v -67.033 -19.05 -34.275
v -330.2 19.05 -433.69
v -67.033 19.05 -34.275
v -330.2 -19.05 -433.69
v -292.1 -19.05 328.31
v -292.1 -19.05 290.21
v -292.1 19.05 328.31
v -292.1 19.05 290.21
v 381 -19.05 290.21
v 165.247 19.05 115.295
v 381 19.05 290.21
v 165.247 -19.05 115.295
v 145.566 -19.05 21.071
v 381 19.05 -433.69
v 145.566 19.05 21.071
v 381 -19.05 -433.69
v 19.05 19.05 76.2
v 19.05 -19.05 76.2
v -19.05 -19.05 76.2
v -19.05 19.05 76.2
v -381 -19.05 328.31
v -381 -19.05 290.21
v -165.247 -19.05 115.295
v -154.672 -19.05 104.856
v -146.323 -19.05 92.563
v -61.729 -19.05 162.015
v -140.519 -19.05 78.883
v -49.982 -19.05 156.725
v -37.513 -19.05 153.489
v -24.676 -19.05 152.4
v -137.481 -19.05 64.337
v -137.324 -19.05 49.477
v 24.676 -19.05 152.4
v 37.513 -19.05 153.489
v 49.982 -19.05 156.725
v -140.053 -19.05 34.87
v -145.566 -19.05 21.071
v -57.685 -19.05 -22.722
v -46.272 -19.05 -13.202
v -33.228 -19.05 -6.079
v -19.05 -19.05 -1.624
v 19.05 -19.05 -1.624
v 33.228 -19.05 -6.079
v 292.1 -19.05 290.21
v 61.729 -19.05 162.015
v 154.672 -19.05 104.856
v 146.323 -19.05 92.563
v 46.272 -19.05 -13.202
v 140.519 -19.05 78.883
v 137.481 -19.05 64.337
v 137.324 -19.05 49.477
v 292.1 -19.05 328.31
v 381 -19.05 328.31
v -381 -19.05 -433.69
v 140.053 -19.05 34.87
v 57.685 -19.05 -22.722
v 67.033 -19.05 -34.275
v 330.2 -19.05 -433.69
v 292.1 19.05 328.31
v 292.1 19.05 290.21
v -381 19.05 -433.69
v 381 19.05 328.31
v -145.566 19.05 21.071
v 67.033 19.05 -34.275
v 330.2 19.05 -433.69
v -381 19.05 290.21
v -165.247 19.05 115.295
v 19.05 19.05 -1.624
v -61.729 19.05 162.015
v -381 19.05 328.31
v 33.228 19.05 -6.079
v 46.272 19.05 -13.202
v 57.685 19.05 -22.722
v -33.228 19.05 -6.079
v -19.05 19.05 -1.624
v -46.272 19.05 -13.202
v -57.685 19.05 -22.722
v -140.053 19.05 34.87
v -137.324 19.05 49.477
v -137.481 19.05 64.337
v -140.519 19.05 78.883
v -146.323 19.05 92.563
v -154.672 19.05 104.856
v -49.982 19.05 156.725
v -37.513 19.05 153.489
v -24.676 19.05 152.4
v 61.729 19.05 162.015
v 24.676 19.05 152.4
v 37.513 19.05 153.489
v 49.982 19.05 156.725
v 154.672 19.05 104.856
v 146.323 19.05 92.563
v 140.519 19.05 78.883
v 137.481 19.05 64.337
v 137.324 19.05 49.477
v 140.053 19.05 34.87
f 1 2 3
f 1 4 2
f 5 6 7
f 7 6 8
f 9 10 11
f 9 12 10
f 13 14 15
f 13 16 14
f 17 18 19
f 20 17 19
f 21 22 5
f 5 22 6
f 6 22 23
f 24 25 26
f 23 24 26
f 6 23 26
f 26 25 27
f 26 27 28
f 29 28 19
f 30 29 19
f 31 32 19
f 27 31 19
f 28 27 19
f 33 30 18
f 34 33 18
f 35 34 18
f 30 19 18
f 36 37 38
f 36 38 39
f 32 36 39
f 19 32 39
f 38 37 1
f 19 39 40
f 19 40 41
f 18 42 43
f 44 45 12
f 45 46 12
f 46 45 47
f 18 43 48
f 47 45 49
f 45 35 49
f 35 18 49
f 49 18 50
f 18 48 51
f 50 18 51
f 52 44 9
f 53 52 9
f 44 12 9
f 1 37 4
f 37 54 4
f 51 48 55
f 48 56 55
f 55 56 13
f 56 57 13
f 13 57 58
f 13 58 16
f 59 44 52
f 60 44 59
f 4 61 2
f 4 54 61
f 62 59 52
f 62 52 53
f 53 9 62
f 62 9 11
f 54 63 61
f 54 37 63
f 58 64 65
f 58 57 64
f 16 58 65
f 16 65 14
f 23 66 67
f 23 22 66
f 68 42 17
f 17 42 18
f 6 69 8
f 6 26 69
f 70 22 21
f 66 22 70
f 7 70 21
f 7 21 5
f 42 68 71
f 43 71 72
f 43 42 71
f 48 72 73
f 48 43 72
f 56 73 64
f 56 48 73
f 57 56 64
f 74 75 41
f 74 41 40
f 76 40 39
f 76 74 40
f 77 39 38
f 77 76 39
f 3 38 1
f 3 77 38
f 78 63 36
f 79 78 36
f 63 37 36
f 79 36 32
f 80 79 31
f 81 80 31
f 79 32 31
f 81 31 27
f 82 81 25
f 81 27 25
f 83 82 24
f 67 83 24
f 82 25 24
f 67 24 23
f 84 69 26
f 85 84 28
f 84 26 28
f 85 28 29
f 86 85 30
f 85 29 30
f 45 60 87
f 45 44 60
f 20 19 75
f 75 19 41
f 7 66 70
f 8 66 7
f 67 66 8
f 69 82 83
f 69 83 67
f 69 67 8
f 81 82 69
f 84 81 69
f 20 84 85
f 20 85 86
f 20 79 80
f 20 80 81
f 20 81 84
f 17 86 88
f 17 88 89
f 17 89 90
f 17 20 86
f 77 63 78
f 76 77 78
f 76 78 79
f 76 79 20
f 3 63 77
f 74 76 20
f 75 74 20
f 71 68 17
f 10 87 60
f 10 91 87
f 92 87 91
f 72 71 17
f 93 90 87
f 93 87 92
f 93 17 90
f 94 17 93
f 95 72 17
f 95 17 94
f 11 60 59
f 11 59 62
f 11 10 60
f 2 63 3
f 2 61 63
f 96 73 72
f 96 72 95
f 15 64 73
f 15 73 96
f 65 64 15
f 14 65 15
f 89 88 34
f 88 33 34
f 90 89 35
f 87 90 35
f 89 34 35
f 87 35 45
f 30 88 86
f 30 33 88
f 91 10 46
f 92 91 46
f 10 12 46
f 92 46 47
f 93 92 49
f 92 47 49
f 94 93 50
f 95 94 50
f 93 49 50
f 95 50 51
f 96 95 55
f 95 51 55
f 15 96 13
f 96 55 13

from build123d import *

# Parameters (mm, degrees)
F1_DEPTH = 19.05
F2_R     = 76.2
F3_W     = 88.9
F3_H     = 38.1
F4_DEPTH = 38.1
F6_DEPTH = 38.101


with BuildPart() as f1:
    # F0 (on Front) → F1 (new body, symmetric)
    with BuildSketch(Plane.XZ):
        Polygon((-44.45, 0), (-19.05, 0), (19.05, 0), (44.45, 0), (330.2, -433.689813), (381, -433.689813), (117.024645, 76.2), (381, 290.210187), (292.1, 290.210187), (44.45, 152.4), (0, 152.4), (-44.45, 152.4), (-292.1, 290.210187), (-381, 290.210187), (-117.024645, 76.2), (-381, -433.689813), (-330.2, -433.689813), align=None)
    extrude(amount=F1_DEPTH, both=True)

    # F2
    f2_edges = [f1.edges().sort_by_distance(p)[0] for p in [
        (117.024645, 0, 76.2),
        (-44.45, 0, 152.4),
        (44.45, 0, 152.4),
        (-117.024645, 0, 76.2),
        (-44.45, 0, 0),
        (44.45, 0, 0),
    ]]
    fillet(f2_edges, radius=F2_R)

    # F3 (on face) → F4 (join)
    with BuildSketch(Plane.XY.offset(290.210187)):
        with Locations((-336.55, 0)):
            Rectangle(F3_W, F3_H)
        with Locations((336.55, 0)):
            Rectangle(F3_W, F3_H)
    extrude(amount=F4_DEPTH)

    # F5 (on face) → F6 (cut, through all)
    with BuildSketch(Plane.XZ.offset(19.05)):
        with BuildLine():
            Line((-19.05, 76.2), (-19.05, -1.623687))
            ThreePointArc((-19.05, -1.623687), (-11.268752, -0.407009), (-3.403482, 0))
            Line((-3.403482, 0), (3.403482, 0))
            ThreePointArc((3.403482, 0), (11.268752, -0.407009), (19.05, -1.623687))
            Line((19.05, -1.623687), (19.05, 76.2))
            Line((19.05, 76.2), (-19.05, 76.2))
        make_face()
        with BuildLine():
            Line((-19.05, -1.623687), (-19.05, -12.7))
            Line((-19.05, -12.7), (19.05, -12.7))
            Line((19.05, -12.7), (19.05, -1.623687))
            ThreePointArc((19.05, -1.623687), (11.268752, -0.407009), (3.403482, 0))
            Line((3.403482, 0), (-3.403482, 0))
            ThreePointArc((-3.403482, 0), (-11.268752, -0.407009), (-19.05, -1.623687))
        make_face()
    extrude(amount=-F6_DEPTH, mode=Mode.SUBTRACT)


solid = f1.part
